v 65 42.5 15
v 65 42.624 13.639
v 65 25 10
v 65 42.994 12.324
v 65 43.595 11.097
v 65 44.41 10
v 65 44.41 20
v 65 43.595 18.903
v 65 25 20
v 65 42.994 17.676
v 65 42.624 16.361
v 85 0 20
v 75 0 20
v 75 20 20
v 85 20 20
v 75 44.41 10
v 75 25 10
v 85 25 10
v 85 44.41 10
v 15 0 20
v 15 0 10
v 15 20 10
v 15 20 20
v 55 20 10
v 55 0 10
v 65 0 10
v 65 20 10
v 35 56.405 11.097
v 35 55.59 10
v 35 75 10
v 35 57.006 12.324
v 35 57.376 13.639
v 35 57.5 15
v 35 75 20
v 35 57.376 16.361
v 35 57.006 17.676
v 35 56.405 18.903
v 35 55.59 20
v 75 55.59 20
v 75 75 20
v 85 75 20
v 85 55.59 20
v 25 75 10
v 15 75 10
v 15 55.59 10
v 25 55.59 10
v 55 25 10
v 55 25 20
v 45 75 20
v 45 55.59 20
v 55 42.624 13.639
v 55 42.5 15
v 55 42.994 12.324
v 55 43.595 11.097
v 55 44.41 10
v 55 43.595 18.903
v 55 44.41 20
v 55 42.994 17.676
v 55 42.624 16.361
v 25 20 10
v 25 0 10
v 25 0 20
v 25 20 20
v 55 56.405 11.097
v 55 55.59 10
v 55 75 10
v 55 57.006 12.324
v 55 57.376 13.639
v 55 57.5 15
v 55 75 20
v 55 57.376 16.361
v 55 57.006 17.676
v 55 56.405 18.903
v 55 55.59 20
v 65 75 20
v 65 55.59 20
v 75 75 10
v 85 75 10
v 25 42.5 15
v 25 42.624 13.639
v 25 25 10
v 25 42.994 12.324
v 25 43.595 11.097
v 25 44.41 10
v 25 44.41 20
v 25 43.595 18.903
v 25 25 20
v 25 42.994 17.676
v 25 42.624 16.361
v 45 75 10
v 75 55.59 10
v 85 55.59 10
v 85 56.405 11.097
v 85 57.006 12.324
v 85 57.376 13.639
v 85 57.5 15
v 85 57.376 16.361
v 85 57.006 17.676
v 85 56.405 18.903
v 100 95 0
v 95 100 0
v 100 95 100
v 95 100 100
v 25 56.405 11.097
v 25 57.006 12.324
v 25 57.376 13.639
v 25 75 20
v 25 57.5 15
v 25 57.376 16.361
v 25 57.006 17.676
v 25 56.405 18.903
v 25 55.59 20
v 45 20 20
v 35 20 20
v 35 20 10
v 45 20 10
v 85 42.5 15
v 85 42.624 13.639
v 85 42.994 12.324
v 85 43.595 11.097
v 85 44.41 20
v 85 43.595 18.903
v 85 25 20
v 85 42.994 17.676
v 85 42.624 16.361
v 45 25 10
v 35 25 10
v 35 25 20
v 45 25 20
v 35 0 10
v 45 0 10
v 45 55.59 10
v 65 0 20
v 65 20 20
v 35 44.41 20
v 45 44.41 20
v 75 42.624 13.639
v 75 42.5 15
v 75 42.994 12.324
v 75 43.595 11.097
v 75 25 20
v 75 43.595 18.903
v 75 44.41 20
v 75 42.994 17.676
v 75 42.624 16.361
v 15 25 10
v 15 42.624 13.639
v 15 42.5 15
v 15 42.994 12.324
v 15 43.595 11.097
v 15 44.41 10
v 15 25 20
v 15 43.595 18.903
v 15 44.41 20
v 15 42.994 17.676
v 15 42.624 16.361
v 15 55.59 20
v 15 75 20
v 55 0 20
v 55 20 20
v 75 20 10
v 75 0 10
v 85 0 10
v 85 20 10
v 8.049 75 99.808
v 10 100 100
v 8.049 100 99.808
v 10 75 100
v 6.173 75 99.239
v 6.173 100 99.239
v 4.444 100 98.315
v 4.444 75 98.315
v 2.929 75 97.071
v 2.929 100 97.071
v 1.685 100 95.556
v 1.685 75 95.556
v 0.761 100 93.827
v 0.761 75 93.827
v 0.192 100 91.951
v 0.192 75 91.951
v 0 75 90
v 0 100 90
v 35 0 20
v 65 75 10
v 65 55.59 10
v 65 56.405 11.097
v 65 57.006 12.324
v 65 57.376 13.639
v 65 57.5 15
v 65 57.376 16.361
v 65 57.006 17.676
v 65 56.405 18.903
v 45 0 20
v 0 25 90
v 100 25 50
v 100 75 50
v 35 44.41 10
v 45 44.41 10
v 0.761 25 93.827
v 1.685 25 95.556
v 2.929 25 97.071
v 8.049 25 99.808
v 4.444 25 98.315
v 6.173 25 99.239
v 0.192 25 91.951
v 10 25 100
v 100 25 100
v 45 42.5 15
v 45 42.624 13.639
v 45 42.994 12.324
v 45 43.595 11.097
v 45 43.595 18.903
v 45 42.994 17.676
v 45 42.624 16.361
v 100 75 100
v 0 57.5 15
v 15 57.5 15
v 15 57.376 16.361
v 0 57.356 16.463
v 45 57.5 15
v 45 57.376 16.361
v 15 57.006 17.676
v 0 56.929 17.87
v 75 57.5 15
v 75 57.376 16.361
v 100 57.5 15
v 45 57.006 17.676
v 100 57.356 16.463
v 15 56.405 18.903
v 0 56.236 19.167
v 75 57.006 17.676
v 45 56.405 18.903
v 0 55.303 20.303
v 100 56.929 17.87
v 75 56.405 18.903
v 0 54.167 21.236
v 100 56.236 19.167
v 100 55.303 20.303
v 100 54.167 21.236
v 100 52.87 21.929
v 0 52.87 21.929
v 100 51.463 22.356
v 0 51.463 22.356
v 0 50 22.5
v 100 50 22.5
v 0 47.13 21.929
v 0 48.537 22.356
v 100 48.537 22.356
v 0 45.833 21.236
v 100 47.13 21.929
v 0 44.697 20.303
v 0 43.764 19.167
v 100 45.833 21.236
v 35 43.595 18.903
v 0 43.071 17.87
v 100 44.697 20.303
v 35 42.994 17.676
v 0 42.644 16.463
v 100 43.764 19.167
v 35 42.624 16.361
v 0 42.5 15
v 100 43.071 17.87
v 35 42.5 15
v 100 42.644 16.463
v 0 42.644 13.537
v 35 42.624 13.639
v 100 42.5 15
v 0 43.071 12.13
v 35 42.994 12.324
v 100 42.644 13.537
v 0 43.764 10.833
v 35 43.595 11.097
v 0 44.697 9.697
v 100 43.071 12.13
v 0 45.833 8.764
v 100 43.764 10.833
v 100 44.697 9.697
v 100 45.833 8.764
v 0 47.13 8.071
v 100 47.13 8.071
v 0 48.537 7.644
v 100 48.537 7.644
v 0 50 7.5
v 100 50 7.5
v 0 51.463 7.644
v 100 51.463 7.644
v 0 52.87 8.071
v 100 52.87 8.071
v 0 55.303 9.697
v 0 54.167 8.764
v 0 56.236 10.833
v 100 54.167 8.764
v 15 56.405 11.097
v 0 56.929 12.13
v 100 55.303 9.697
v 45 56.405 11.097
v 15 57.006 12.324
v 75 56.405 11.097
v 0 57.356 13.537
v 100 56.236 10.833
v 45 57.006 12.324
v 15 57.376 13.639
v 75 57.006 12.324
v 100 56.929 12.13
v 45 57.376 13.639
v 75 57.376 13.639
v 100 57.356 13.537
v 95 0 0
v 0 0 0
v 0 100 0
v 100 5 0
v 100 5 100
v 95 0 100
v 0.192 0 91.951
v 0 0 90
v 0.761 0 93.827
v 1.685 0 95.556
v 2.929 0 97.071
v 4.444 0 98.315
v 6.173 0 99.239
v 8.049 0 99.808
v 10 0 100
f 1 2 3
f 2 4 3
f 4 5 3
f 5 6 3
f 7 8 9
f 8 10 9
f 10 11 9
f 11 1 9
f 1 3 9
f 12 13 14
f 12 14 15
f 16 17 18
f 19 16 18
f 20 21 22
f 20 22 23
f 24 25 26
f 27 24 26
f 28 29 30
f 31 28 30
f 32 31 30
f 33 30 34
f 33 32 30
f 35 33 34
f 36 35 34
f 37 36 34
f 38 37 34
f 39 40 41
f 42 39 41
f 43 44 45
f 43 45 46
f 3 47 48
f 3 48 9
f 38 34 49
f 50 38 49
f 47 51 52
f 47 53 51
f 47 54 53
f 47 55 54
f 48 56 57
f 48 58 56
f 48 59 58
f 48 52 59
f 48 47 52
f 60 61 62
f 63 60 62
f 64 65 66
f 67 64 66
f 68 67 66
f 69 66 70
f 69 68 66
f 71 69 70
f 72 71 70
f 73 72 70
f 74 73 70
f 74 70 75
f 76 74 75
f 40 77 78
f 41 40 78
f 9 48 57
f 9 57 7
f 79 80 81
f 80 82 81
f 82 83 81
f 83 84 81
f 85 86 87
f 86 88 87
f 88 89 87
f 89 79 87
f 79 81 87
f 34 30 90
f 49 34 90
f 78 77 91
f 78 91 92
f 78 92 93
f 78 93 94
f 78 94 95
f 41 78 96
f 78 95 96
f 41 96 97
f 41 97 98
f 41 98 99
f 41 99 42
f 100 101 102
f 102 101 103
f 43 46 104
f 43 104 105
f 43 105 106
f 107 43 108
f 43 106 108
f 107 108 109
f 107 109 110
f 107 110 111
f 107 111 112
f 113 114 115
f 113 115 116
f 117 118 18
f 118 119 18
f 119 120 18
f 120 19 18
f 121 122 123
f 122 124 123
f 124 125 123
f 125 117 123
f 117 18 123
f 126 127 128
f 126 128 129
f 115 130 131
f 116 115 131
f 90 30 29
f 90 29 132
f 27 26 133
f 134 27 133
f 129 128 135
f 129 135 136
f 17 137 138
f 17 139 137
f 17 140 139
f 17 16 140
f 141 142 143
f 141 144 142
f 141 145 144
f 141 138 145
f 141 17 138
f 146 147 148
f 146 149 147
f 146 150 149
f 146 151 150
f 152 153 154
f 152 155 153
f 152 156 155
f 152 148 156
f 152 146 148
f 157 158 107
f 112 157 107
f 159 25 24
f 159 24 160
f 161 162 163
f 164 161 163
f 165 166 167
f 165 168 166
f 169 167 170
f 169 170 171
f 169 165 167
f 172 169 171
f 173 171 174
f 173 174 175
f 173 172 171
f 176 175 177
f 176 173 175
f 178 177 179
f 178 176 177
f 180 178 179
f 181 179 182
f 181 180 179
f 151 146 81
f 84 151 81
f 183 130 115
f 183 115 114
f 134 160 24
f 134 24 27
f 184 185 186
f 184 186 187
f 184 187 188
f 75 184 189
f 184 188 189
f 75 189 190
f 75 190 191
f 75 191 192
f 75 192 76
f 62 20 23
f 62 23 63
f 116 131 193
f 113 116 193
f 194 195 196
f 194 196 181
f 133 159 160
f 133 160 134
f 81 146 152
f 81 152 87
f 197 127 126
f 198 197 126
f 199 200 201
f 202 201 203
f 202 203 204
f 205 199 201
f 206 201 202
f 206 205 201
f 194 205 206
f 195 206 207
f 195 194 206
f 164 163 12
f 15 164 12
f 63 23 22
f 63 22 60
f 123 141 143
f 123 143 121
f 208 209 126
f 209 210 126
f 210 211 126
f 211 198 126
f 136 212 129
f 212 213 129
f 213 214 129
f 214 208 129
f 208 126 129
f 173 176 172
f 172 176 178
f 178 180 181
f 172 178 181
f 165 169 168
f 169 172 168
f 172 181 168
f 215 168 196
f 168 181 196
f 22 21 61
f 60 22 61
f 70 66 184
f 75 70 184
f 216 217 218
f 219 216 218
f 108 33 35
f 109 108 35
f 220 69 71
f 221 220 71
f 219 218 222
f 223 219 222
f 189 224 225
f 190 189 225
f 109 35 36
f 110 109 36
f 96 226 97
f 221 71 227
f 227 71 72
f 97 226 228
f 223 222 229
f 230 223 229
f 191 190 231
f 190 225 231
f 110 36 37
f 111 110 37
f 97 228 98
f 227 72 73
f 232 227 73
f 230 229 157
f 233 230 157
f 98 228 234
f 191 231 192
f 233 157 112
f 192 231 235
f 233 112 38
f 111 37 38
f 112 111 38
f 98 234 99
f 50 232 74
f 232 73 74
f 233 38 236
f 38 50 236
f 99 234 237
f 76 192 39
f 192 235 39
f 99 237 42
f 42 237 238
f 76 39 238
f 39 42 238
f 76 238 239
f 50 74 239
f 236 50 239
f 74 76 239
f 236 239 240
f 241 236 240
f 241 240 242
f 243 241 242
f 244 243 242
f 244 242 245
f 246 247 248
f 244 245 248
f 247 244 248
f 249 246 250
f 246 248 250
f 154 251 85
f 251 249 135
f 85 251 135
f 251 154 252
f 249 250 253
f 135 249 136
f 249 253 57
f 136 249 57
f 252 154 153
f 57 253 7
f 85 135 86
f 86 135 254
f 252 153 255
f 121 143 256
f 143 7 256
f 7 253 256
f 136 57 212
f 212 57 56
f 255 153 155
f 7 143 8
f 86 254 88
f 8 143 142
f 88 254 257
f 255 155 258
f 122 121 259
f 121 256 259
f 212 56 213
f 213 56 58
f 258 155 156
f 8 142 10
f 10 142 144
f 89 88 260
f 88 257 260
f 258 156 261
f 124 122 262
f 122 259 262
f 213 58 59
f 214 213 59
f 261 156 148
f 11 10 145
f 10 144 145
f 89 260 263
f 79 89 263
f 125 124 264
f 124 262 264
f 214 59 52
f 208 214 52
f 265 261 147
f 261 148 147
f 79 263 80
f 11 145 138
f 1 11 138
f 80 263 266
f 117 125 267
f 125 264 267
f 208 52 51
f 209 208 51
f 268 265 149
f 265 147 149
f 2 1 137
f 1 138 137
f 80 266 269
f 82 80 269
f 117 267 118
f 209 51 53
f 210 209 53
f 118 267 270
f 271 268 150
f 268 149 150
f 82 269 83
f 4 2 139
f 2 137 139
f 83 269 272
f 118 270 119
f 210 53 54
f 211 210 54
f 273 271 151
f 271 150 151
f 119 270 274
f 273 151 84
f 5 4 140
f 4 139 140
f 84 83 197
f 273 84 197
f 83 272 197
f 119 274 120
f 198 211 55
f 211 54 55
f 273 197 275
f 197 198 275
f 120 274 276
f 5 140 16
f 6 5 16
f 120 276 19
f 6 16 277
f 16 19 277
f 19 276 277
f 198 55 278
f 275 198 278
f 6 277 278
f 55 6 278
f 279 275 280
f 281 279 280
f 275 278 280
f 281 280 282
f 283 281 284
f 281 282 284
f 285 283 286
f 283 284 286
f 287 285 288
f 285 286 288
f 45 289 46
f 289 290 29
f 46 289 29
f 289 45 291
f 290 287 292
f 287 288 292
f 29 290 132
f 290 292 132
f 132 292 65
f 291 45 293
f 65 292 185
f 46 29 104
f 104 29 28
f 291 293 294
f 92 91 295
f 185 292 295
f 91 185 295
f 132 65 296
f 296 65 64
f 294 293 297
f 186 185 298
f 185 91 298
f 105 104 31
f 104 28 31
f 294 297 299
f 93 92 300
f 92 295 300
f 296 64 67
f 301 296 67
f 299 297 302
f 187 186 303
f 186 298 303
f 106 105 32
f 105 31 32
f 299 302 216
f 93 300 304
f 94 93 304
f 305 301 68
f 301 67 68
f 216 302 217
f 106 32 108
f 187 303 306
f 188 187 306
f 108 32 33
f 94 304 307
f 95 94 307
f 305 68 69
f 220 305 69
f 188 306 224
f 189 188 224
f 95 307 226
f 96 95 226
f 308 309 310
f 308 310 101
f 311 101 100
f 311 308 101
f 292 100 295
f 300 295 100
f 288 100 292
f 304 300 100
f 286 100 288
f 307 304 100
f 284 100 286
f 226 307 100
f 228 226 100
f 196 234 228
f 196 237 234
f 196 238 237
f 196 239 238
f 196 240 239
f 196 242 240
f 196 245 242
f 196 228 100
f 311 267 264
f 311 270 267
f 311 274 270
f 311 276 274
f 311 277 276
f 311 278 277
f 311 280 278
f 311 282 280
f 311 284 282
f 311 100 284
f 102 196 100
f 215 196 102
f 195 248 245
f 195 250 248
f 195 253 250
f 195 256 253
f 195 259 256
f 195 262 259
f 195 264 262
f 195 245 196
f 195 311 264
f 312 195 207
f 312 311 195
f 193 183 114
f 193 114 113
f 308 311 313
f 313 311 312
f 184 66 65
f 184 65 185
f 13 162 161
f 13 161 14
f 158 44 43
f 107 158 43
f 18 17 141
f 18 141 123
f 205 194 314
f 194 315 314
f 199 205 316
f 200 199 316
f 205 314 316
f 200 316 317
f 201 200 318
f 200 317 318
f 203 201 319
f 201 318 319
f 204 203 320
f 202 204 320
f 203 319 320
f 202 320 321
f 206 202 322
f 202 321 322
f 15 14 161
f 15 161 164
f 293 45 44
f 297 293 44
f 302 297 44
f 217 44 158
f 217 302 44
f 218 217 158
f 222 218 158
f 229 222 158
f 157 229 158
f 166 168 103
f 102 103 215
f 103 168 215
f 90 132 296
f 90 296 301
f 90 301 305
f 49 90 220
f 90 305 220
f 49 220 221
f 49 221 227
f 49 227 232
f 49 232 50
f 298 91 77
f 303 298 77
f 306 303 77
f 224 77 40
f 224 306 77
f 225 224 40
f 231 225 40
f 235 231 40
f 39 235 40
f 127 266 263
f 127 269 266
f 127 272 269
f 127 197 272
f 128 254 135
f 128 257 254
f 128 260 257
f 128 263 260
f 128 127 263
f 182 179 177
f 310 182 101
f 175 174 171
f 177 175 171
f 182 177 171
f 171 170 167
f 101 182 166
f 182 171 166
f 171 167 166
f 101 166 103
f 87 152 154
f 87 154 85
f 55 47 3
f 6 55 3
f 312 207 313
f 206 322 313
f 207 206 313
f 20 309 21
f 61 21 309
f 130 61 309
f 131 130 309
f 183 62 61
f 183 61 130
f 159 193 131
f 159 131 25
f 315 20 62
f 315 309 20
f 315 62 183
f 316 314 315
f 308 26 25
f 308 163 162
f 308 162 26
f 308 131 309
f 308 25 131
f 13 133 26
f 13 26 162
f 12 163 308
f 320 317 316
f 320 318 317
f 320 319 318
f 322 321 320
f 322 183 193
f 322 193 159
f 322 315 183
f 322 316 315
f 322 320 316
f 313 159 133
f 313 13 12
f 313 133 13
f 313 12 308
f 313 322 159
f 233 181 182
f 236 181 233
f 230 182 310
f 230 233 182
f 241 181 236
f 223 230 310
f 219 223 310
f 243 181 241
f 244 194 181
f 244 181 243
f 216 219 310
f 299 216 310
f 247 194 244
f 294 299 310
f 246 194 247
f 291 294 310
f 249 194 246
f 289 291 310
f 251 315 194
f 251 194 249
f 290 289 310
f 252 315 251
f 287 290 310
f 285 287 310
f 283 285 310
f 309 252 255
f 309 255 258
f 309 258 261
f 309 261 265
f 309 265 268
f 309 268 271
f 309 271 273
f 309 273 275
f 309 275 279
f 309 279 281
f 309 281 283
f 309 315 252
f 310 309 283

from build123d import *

# Parameters (mm, degrees)
F0_W     = 10
F0_H     = 10
F1_DEPTH = 100
F2_W     = 100
F2_H     = 25
F3_DEPTH = 100
F4_R     = 10
F6_D     = 15
F7_DEPTH = 20
F8_SIZE  = 5


with BuildPart() as f1:
    # F0 (on Front) → F1 (new body)
    with BuildSketch(Plane.XZ):
        Polygon((100, 50), (0, 90), (0, 10), (0, 0), (100, 0), align=None)
        with Locations((20, 15)):
            Rectangle(F0_W, F0_H, mode=Mode.SUBTRACT)
        with Locations((40, 15)):
            Rectangle(F0_W, F0_H, mode=Mode.SUBTRACT)
        with Locations((60, 15)):
            Rectangle(F0_W, F0_H, mode=Mode.SUBTRACT)
        with Locations((80, 15)):
            Rectangle(F0_W, F0_H, mode=Mode.SUBTRACT)
    extrude(amount=-F1_DEPTH)

    # F2 (on face) → F3 (join)
    with BuildSketch(Plane(origin=(0, 0, 0), x_dir=(1, 0, 0), z_dir=(0, 0, -1))):
        with Locations((50, -12.5)):
            Rectangle(F2_W, F2_H)
        with Locations((50, -87.5)):
            Rectangle(F2_W, F2_H)
    extrude(amount=-F3_DEPTH)

    # F4
    f4_edges = [f1.edges().sort_by_distance(p)[0] for p in [
        (0, 12.5, 100),
        (0, 87.5, 100),
    ]]
    fillet(f4_edges, radius=F4_R)

    # F6 (through all)
    with Locations(Plane(origin=(0, 0, 0), x_dir=(0, -1, 0), z_dir=(-1, 0, 0))):
        with Locations((-50, 15)):
            Hole(F6_D / 2)

    # F0 (on Front) → F7 (cut)
    with BuildSketch(Plane.XZ):
        with Locations((80, 15)):
            Rectangle(F0_W, F0_H)
        with Locations((60, 15)):
            Rectangle(F0_W, F0_H)
        with Locations((40, 15)):
            Rectangle(F0_W, F0_H)
        with Locations((20, 15)):
            Rectangle(F0_W, F0_H)
    extrude(amount=-F7_DEPTH, mode=Mode.SUBTRACT)

    # F8
    f8_edges = [f1.edges().sort_by_distance(p)[0] for p in [
        (100, 0, 50),
        (100, 100, 50),
    ]]
    chamfer(f8_edges, length=F8_SIZE)


solid = f1.part
